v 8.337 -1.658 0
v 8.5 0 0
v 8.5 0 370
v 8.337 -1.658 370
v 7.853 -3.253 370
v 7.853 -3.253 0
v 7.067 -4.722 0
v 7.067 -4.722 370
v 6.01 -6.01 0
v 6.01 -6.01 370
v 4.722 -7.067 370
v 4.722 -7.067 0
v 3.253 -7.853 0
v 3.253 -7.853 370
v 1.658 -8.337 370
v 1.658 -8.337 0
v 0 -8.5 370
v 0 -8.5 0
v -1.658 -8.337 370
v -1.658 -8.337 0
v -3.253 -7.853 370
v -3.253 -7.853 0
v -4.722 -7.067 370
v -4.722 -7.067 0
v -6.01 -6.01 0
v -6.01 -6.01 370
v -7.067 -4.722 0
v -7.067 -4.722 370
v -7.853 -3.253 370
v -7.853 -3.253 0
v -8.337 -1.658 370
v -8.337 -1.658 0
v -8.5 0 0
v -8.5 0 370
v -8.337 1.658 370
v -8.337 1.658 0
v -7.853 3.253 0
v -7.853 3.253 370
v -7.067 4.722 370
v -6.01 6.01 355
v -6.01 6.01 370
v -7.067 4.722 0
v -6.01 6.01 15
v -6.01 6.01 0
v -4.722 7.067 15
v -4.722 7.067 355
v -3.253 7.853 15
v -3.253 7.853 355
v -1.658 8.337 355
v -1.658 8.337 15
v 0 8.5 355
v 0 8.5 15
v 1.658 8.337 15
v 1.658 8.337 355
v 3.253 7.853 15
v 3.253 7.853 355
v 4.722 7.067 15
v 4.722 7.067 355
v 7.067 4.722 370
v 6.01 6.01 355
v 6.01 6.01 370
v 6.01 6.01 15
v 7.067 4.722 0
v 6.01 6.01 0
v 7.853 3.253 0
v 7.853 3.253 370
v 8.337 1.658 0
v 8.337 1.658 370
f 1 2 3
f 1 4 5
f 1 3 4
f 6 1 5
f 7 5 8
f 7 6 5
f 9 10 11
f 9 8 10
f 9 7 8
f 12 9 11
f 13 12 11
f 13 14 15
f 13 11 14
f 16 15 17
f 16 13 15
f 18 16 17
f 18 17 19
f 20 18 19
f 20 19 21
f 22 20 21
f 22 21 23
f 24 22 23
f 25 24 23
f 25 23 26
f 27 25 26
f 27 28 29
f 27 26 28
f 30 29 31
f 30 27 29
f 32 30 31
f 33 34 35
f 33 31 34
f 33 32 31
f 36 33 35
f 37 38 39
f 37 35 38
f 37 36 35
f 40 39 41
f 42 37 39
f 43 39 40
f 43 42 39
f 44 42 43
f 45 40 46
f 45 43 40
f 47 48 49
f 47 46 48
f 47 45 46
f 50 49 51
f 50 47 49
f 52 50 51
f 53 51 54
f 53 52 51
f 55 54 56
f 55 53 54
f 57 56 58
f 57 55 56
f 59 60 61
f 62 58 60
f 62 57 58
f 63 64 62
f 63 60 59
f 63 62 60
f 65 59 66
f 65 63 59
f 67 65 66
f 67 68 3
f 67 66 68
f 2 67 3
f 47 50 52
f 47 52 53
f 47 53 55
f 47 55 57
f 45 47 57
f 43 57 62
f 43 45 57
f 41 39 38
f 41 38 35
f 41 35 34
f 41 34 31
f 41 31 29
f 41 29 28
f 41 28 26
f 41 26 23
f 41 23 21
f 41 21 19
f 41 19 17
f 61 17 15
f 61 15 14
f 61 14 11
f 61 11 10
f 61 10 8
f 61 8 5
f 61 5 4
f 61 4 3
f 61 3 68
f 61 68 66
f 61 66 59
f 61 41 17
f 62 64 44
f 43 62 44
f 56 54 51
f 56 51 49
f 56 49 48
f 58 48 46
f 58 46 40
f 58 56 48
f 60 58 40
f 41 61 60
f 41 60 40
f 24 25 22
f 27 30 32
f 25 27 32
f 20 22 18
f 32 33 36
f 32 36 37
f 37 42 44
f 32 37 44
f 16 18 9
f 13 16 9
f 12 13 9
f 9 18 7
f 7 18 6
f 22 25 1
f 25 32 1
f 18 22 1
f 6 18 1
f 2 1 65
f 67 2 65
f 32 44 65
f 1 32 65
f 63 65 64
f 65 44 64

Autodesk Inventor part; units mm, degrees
ref_plane "YZ Plane" through (0, 0, 0) normal (1, 0, 0) x (0, 1, 0)
ref_plane "XZ Plane" through (0, 0, 0) normal (0, 1, 0) x (-1, 0, 0)
ref_plane "XY Plane" through (0, 0, 0) normal (0, 0, 1) x (1, 0, 0)
sketch "Sketch2" plane through (0, 0, 0) normal (0, 0, 1) x (1, 0, 0)
  circle A0 centre (0, 0) radius 8.5
  dimension "d4" = 17
extrude "Extrusion2" add sketch "Sketch2" along normal blind 370
sketch "Sketch3" plane through (0, 0, 370) normal (0, 0, 1) x (1, 0, 0)
  circle A0 centre (0, 0) radius 8.5 projected
  arc A1 (6.0104, 6.0104) -> (-6.0104, 6.0104) centre (0, 0) ccw
  line L0 (0, 0) -> (6.0104, 6.0104) construction
  line L1 (0, 0) -> (8.5, 0) construction
  line L2 (0, 0) -> (-6.0104, 6.0104) construction
  arc A2 (6.0104, 6.0104) -> (-6.0104, 6.0104) centre (0, 0) ccw
  line L3 (6.0104, 6.0104) -> (-6.0104, 6.0104)
  point P0 (-6.0104, 6.0104)
  dimension "d7" = 45
extrude "Extrusion3" cut sketch "Sketch3" against normal blind 15 contours L3 A0 picked at (-0.3172, 6.8225)
sketch "Sketch4" plane through (0, 0, 0) normal (0, 0, -1) x (-1, 0, 0)
  arc A0 (-6.0104, 6.0104) -> (6.0104, 6.0104) centre (0, 0) ccw projected
  arc A1 (6.0104, 6.0104) -> (-6.0104, 6.0104) centre (0, 0) ccw
  line L0 (0, 0) -> (-6.0104, 6.0104) construction
  line L1 (0, 0) -> (6.0104, 6.0104) construction
  arc A2 (-6.0104, 6.0104) -> (6.0104, 6.0104) centre (0, 12.0208) ccw
  line L2 (-6.0104, 6.0104) -> (6.0104, 6.0104) projected
  line L3 (-6.0104, 6.0104) -> (6.0104, 6.0104)
  dimension "d11" = 90
extrude "Extrusion4" cut sketch "Sketch4" against normal blind 15 contours A1 L2
properties part number "Project_stationary_rod"
